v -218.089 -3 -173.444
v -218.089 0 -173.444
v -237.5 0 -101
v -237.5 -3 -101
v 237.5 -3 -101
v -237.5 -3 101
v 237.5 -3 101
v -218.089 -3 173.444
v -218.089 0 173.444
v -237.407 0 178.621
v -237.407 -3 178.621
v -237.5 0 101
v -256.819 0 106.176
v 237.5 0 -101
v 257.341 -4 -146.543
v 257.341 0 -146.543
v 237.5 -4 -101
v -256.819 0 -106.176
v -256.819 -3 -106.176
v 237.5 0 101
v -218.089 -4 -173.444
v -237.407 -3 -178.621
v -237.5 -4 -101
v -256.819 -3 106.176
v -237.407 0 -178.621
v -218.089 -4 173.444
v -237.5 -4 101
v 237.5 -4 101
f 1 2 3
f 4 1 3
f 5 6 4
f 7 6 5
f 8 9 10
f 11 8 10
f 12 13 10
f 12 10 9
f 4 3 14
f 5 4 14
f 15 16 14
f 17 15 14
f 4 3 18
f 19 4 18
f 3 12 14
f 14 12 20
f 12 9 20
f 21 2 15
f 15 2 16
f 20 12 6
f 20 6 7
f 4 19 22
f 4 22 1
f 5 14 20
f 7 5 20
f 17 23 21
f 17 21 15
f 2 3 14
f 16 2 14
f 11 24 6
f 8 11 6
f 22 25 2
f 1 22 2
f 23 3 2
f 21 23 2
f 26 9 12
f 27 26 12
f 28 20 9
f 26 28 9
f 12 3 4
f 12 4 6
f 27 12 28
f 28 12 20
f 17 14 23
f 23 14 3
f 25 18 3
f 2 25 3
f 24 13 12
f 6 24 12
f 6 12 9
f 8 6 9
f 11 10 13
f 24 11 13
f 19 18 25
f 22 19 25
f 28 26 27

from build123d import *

# Parameters (mm, degrees)
F1_DEPTH = 4
F0_W     = 475
F0_H     = 202
F2_DEPTH = 3


# Not quite as in the source:
# - a feature names something its author has since deleted; it is built from what else it names


with BuildPart() as f1:
    # F0 (on Front) → F1 (new body)
    with BuildSketch(Plane.XZ):
        Polygon((-218.0885716173, 173.4444369717), (-237.5, 101), (237.5, 101), align=None)
    extrude(amount=F1_DEPTH)


with BuildPart() as f1b:
    # F0 (on Front) → F1, piece 2 (new body)
    with BuildSketch(Plane.XZ):
        Polygon((237.5, -101), (-237.5, -101), (-218.0885716173, -173.4444369717), (257.3408484459, -146.5434581041), align=None)
    extrude(amount=F1_DEPTH)


with BuildPart() as f2:
    # F0 (on Front) → F2 (new body)
    with BuildSketch(Plane.XZ):
        Rectangle(F0_W, F0_H)
    extrude(amount=F2_DEPTH)


with BuildPart() as f2b:
    # F0 (on Front) → F2, piece 2 (new body)
    with BuildSketch(Plane.XZ):
        Polygon((-256.8185165258, 106.1763809021), (-237.5, 101), (-218.0885716173, 173.4444369717), (-237.4070881431, 178.6208178737), align=None)
    extrude(amount=F2_DEPTH)


with BuildPart() as f2c:
    # F0 (on Front) → F2, piece 3 (new body)
    with BuildSketch(Plane.XZ):
        Polygon((-218.0885716173, -173.4444369717), (-237.5, -101), (-256.8185165258, -106.1763809021), (-237.4070881431, -178.6208178737), align=None)
    extrude(amount=F2_DEPTH)


solid = Compound([f1.part, f1b.part, f2.part, f2b.part, f2c.part])
